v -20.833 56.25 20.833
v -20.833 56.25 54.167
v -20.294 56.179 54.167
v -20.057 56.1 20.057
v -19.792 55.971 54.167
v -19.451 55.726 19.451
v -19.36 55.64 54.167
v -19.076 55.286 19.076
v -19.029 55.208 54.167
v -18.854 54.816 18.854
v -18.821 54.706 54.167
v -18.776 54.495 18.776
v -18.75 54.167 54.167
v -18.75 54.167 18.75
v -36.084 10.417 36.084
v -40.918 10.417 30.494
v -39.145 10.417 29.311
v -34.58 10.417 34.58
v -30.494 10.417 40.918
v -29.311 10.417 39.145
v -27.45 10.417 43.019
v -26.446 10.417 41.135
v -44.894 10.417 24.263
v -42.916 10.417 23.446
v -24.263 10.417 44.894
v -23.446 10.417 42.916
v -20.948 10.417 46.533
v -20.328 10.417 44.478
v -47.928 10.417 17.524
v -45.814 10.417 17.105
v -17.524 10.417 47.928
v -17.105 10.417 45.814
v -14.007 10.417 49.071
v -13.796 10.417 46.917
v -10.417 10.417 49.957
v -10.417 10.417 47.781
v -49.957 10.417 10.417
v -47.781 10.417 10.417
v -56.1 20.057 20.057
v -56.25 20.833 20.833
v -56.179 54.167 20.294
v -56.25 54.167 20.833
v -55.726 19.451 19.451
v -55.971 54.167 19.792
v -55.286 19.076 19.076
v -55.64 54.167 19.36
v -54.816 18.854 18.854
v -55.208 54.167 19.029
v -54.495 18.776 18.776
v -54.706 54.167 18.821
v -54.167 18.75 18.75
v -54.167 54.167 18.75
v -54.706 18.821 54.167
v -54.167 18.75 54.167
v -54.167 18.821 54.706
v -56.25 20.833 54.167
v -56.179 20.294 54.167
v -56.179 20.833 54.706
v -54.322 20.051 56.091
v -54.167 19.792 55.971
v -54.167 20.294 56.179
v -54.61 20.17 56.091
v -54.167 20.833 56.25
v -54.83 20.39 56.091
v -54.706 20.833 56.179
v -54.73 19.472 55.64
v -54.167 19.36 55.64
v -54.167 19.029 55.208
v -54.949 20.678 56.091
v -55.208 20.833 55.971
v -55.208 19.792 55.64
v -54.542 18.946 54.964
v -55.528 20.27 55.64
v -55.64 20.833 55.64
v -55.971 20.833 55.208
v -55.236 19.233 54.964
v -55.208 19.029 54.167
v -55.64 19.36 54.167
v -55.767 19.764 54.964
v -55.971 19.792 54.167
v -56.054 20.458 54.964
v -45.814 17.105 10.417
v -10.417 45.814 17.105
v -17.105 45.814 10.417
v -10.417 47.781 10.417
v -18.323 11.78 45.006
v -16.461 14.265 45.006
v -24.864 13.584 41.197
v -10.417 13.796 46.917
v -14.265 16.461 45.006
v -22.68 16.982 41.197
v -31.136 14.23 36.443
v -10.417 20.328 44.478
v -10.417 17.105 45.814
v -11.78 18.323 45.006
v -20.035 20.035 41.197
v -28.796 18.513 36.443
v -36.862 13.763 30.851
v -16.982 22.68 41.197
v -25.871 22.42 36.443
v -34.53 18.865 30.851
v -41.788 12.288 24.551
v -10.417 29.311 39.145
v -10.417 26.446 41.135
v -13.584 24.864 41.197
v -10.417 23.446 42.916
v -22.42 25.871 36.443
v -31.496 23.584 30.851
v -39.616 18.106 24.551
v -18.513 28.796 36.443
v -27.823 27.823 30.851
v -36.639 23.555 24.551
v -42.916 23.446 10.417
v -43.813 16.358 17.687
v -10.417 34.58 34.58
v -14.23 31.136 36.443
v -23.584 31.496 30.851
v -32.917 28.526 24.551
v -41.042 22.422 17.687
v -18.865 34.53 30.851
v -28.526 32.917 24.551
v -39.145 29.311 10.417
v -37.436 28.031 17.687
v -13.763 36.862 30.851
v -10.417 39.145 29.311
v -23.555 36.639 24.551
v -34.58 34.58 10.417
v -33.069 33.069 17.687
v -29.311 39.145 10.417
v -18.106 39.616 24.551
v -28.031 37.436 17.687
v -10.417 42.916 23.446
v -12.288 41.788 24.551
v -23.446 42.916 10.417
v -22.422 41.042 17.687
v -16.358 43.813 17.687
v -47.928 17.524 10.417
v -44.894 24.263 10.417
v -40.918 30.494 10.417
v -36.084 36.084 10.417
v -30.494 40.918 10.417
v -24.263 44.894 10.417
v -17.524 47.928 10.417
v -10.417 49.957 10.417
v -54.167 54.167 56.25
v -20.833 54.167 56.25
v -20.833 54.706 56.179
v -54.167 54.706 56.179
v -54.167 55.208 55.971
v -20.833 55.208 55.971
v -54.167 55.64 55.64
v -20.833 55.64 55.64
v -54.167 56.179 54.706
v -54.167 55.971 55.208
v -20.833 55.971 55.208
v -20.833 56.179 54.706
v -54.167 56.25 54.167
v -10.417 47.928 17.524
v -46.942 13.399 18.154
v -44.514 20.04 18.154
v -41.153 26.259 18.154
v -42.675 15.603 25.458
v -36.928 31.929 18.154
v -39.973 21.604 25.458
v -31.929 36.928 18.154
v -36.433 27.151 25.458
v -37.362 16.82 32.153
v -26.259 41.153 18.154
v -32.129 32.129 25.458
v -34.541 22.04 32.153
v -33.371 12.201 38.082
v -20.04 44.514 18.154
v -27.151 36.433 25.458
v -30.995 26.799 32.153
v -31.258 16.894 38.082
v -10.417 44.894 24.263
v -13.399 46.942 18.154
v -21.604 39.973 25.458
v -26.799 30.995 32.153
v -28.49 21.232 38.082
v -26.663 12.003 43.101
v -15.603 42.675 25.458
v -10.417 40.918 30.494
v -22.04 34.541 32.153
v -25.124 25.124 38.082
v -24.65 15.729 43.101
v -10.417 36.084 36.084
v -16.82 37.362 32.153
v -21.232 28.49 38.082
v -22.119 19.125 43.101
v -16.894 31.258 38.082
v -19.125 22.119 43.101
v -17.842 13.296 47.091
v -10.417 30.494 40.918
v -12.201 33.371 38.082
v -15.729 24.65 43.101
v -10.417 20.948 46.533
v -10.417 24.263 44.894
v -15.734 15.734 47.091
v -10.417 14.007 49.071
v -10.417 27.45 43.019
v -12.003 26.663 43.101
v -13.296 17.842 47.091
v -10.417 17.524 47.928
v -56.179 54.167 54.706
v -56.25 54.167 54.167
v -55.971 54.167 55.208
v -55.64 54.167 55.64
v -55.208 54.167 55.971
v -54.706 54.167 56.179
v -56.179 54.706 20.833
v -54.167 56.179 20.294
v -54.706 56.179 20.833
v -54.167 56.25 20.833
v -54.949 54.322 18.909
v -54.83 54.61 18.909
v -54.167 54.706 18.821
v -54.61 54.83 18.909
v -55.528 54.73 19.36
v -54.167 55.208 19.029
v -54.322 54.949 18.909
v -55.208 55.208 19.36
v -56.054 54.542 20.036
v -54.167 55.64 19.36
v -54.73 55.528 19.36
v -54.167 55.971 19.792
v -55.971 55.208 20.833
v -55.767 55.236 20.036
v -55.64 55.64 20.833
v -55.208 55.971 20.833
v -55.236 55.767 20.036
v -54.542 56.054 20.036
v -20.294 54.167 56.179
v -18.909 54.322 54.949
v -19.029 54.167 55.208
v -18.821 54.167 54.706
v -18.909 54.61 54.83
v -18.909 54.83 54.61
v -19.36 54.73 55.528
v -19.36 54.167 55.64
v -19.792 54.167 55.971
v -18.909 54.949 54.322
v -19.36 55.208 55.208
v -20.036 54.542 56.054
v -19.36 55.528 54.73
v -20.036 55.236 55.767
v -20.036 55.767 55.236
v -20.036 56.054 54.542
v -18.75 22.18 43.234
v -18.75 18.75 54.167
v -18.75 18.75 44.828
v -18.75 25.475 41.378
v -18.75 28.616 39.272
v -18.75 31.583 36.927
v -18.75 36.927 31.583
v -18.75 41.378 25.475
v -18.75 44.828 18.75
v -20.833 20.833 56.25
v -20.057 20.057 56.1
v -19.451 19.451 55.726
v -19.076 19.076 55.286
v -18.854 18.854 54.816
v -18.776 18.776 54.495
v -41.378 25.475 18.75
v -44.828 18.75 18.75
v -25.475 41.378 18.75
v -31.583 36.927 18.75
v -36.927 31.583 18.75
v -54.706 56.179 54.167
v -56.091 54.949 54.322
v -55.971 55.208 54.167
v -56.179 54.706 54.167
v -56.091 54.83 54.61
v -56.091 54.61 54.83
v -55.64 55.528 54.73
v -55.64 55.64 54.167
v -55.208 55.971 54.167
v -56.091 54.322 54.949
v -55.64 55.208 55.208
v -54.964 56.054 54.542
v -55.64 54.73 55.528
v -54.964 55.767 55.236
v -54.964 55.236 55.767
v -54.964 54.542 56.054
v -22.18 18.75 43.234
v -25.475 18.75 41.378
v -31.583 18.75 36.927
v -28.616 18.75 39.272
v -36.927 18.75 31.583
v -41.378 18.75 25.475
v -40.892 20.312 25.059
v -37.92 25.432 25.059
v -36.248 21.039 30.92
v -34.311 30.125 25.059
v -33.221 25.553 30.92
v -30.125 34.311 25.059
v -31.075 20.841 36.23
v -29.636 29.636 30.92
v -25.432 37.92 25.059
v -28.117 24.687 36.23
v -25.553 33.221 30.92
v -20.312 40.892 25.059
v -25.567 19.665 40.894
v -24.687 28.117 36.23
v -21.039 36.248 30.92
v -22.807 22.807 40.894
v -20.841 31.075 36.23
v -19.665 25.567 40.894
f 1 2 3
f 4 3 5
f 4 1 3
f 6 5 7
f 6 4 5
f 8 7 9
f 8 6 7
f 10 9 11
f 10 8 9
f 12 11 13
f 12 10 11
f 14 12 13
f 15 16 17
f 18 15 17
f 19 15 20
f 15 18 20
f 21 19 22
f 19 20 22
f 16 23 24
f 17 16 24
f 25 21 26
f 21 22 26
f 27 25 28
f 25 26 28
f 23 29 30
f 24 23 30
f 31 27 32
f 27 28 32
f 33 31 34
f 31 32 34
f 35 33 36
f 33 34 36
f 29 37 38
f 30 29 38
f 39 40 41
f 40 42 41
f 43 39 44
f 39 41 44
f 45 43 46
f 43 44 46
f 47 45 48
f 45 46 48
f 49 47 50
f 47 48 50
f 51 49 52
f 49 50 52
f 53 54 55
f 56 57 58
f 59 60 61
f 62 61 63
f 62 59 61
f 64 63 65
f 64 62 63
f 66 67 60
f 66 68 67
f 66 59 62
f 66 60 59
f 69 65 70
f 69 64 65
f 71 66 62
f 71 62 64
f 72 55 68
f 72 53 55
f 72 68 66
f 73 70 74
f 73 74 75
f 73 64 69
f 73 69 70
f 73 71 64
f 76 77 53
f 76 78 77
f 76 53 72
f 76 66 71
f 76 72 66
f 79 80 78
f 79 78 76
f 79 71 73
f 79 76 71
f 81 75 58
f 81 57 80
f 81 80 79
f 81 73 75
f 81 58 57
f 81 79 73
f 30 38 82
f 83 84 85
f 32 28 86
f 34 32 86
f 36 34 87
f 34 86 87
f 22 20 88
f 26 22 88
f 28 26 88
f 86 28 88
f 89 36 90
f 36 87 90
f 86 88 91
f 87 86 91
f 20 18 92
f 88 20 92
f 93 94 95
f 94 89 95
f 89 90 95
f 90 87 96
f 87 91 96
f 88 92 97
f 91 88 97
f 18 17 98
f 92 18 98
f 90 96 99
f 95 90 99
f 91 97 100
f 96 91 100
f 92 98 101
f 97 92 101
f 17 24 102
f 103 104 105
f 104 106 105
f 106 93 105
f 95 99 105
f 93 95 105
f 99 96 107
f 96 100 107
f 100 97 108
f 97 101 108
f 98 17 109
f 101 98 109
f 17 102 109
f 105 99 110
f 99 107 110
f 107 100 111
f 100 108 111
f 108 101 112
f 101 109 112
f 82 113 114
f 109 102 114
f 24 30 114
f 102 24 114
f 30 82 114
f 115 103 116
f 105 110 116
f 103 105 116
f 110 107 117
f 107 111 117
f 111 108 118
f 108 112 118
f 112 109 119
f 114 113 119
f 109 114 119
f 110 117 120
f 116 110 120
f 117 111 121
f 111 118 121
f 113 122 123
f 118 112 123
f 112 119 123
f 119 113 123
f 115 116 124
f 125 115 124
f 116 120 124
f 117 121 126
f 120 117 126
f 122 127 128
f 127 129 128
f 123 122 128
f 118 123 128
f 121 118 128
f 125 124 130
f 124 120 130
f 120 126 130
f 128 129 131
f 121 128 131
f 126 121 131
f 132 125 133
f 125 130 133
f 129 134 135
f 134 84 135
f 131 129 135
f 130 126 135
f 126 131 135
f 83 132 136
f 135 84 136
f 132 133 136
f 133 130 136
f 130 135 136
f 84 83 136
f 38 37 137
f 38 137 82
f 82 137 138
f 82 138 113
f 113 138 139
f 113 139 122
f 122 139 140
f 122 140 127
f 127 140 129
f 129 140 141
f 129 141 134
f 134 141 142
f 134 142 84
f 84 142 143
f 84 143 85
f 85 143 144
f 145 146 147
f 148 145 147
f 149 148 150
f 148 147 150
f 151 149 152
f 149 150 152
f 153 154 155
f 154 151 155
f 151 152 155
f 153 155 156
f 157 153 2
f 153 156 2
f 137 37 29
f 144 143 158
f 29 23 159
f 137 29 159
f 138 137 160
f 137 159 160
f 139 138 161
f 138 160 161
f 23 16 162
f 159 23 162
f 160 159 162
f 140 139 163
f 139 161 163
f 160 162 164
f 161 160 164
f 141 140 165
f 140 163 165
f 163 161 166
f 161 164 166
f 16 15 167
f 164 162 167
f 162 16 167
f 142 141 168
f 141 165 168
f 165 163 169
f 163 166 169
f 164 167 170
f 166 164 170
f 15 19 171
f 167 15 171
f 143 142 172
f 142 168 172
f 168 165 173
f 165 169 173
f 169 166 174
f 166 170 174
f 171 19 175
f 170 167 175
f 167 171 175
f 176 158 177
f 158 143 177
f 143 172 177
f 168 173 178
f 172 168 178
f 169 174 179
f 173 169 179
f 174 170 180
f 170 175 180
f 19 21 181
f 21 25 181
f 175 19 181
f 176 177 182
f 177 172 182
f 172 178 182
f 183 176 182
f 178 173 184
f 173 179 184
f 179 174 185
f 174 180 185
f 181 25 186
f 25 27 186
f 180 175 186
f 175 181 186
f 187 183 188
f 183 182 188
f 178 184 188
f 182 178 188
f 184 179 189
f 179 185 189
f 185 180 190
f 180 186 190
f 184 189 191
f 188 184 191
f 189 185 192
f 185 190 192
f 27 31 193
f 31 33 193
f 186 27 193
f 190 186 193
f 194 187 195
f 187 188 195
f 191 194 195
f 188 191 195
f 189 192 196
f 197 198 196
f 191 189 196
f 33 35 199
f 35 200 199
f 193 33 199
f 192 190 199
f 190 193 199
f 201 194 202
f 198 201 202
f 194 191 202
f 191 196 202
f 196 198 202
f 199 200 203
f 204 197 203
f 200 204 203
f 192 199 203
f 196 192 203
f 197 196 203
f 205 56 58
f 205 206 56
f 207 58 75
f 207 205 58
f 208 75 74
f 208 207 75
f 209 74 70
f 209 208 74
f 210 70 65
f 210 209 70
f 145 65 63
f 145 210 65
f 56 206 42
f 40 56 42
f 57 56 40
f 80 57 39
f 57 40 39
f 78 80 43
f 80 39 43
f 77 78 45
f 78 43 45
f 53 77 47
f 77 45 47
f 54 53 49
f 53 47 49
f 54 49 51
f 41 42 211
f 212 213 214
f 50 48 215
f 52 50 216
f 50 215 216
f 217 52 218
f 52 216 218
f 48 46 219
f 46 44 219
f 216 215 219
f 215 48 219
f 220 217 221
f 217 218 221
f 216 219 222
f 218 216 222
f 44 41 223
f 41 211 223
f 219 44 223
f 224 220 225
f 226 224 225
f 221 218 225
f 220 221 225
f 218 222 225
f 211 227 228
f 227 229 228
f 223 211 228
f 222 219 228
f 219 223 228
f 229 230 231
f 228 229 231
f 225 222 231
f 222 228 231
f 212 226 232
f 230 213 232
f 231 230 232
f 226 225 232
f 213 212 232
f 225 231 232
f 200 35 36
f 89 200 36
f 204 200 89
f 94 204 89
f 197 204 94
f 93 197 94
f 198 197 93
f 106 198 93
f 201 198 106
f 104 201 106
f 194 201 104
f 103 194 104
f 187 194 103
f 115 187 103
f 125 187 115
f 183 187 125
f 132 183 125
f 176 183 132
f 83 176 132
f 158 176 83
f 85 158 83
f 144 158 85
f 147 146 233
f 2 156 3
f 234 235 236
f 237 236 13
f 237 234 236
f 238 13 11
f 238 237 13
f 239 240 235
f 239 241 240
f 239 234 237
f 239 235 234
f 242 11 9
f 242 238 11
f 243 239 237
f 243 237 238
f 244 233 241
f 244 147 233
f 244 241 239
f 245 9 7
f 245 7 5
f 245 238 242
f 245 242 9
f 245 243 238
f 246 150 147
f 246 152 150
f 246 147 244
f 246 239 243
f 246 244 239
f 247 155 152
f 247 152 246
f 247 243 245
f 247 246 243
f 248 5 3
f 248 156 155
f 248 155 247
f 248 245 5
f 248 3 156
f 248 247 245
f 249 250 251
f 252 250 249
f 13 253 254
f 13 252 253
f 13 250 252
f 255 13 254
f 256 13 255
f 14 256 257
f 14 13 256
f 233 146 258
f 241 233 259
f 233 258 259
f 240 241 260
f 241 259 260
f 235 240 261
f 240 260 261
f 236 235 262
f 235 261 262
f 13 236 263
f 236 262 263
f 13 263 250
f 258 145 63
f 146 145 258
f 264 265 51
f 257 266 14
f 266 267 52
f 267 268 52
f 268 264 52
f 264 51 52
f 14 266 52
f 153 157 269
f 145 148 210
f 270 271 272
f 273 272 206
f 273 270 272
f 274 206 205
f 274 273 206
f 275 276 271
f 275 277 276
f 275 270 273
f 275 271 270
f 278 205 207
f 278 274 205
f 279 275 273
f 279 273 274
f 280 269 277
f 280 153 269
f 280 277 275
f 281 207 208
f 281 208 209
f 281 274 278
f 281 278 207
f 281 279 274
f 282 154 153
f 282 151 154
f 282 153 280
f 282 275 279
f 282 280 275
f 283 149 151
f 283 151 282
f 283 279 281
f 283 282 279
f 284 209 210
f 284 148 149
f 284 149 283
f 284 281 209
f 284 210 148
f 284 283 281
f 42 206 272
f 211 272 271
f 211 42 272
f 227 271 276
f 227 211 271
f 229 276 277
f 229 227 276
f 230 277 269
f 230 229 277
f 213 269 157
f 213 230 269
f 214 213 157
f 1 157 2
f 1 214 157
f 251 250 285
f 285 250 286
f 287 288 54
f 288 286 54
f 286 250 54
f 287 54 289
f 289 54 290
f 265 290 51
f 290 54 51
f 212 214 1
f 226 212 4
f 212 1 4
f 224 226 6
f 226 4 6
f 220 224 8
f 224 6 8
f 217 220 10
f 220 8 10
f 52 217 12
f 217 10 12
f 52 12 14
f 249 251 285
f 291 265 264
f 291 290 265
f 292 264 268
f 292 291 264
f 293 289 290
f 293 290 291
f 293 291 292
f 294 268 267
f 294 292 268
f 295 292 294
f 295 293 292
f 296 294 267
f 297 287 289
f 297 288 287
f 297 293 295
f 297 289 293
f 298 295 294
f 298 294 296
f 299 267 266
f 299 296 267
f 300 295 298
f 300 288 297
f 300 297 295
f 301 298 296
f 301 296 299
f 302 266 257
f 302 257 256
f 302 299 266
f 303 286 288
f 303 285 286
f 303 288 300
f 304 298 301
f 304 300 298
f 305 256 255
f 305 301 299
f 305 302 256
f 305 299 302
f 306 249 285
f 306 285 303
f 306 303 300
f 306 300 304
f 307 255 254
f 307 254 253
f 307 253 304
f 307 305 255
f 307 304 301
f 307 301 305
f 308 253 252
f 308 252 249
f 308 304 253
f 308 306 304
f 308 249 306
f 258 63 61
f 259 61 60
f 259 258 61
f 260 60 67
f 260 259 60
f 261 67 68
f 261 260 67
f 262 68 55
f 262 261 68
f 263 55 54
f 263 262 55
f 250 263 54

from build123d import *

# Parameters (mm, degrees)
SKETCH_1_W          = 54
SKETCH_1_H          = 54
EXTRUDE_1_DEPTH     = 27
CUT_EXTRUDE_2_DEPTH = 54
SKETCH_4_W          = 36
SKETCH_4_H          = 18
CUT_EXTRUDE_3_DEPTH = 43.213741838
FILLET_2_R          = 1
REVOLVE_8_ANGLE     = 90
SKETCH_8_W          = 28.0496759
SKETCH_8_H          = 27.957000759
CUT_EXTRUDE_4_DEPTH = 45.068129073
SKETCH_9_W          = 27.76443714
SKETCH_9_H          = 23.535416913
CUT_EXTRUDE_5_DEPTH = 45.068129073
SKETCH_10_W         = 23.194528254
SKETCH_10_H         = 22.885611119
CUT_EXTRUDE_6_DEPTH = 54
SCALE_2_SCALE       = 2.083333333


with BuildPart() as part:
    # 草图1 → 凸台-拉伸1 (new, symmetric)
    with BuildSketch(Plane(origin=(0, 0, 0), x_dir=(1, 0, 0), z_dir=(0, 1, 0))):
        Rectangle(SKETCH_1_W, SKETCH_1_H)
    extrude(amount=EXTRUDE_1_DEPTH, both=True)

    # 草图2 → 切除-拉伸2 (cut)
    with BuildSketch(Plane.ZY.offset(27)):
        Polygon((9, 27), (-27, 27), (-27, -27), (27, -27), (27, 9), (9, 9), align=None)
    extrude(amount=-CUT_EXTRUDE_2_DEPTH, mode=Mode.SUBTRACT)

    # 草图4 → 切除-拉伸3 (cut, through all)
    with BuildSketch(Plane(origin=(0, 27, 0), x_dir=(1, 0, 0), z_dir=(0, 1, 0))):
        with Locations((9, -18)):
            Rectangle(SKETCH_4_W, SKETCH_4_H)
    extrude(amount=-CUT_EXTRUDE_3_DEPTH, mode=Mode.SUBTRACT)

    # 圆角2
    fillet_2_edges = [part.edges().sort_by_distance(p)[0] for p in [
        (-18, 27, 27),
        (-27, 27, 18),
        (-27, 18, 9),
        (-27, 9, 18),
        (-18, 9, 27),
        (-18, 27, 9),
        (-9, 18, 27),
        (-9, 27, 18),
        (-27, 18, 27),
    ]]
    fillet(fillet_2_edges, radius=FILLET_2_R)

    # 草图5 → 切除-旋转6 (revolve, cut)
    with BuildSketch(Plane(origin=(0, 0, 0), x_dir=(1, 0, 0), z_dir=(0, 1, 0))):
        with BuildLine():
            Line((0, -25), (0, 25))
            ThreePointArc((0, 25), (-25, 0), (0, -25))
        make_face()
    revolve(axis=Axis((0, 0, 25), (0, 0, -1)), mode=Mode.SUBTRACT)


with BuildPart() as body_2:
    # 草图6 → 旋转8 (revolve)
    with BuildSketch(Plane(origin=(0, 0, 0), x_dir=(1, 0, 0), z_dir=(0, 1, 0))):
        with BuildLine():
            Line((-24, 0), (-25, 0))
            ThreePointArc((-25, 0), (-17.67766953, -17.67766953), (0, -25))
            Line((0, -25), (0, -24))
            ThreePointArc((0, -24), (-16.970562748, -16.970562748), (-24, 0))
        make_face()
    revolve(axis=Axis((0, 0, 25), (0, 0, -1)), revolution_arc=REVOLVE_8_ANGLE)

    # 草图8 → 切除-拉伸4 (cut, through all)
    with BuildSketch(Plane.XY.offset(5)):
        with Locations((-13.438216573, 13.330095576)):
            Rectangle(SKETCH_8_W, SKETCH_8_H)
    extrude(amount=-CUT_EXTRUDE_4_DEPTH, mode=Mode.SUBTRACT)

    # 草图9 → 切除-拉伸5 (cut, through all)
    with BuildSketch(Plane(origin=(0, 5, 0), x_dir=(1, 0, 0), z_dir=(0, 1, 0))):
        with Locations((-13.547684968, -15.66850606)):
            Rectangle(SKETCH_9_W, SKETCH_9_H)
    extrude(amount=-CUT_EXTRUDE_5_DEPTH, mode=Mode.SUBTRACT)

    # 草图10 → 切除-拉伸6 (cut)
    with BuildSketch(Plane(origin=(-5, 0, 0), x_dir=(0, 0, -1), z_dir=(1, 0, 0))):
        with Locations((-15.526919039, 15.634156075)):
            Rectangle(SKETCH_10_W, SKETCH_10_H)
    extrude(amount=CUT_EXTRUDE_6_DEPTH, mode=Mode.SUBTRACT)


with BuildPart() as part_1:
    # 缩放比例2: scaled about (0, 0, 0)
    add(part.part.scale(SCALE_2_SCALE))


with BuildPart() as body_2_1:
    # 缩放比例2: scaled about (0, 0, 0)
    add(body_2.part.scale(SCALE_2_SCALE))


solid = Compound([part_1.part, body_2_1.part])
